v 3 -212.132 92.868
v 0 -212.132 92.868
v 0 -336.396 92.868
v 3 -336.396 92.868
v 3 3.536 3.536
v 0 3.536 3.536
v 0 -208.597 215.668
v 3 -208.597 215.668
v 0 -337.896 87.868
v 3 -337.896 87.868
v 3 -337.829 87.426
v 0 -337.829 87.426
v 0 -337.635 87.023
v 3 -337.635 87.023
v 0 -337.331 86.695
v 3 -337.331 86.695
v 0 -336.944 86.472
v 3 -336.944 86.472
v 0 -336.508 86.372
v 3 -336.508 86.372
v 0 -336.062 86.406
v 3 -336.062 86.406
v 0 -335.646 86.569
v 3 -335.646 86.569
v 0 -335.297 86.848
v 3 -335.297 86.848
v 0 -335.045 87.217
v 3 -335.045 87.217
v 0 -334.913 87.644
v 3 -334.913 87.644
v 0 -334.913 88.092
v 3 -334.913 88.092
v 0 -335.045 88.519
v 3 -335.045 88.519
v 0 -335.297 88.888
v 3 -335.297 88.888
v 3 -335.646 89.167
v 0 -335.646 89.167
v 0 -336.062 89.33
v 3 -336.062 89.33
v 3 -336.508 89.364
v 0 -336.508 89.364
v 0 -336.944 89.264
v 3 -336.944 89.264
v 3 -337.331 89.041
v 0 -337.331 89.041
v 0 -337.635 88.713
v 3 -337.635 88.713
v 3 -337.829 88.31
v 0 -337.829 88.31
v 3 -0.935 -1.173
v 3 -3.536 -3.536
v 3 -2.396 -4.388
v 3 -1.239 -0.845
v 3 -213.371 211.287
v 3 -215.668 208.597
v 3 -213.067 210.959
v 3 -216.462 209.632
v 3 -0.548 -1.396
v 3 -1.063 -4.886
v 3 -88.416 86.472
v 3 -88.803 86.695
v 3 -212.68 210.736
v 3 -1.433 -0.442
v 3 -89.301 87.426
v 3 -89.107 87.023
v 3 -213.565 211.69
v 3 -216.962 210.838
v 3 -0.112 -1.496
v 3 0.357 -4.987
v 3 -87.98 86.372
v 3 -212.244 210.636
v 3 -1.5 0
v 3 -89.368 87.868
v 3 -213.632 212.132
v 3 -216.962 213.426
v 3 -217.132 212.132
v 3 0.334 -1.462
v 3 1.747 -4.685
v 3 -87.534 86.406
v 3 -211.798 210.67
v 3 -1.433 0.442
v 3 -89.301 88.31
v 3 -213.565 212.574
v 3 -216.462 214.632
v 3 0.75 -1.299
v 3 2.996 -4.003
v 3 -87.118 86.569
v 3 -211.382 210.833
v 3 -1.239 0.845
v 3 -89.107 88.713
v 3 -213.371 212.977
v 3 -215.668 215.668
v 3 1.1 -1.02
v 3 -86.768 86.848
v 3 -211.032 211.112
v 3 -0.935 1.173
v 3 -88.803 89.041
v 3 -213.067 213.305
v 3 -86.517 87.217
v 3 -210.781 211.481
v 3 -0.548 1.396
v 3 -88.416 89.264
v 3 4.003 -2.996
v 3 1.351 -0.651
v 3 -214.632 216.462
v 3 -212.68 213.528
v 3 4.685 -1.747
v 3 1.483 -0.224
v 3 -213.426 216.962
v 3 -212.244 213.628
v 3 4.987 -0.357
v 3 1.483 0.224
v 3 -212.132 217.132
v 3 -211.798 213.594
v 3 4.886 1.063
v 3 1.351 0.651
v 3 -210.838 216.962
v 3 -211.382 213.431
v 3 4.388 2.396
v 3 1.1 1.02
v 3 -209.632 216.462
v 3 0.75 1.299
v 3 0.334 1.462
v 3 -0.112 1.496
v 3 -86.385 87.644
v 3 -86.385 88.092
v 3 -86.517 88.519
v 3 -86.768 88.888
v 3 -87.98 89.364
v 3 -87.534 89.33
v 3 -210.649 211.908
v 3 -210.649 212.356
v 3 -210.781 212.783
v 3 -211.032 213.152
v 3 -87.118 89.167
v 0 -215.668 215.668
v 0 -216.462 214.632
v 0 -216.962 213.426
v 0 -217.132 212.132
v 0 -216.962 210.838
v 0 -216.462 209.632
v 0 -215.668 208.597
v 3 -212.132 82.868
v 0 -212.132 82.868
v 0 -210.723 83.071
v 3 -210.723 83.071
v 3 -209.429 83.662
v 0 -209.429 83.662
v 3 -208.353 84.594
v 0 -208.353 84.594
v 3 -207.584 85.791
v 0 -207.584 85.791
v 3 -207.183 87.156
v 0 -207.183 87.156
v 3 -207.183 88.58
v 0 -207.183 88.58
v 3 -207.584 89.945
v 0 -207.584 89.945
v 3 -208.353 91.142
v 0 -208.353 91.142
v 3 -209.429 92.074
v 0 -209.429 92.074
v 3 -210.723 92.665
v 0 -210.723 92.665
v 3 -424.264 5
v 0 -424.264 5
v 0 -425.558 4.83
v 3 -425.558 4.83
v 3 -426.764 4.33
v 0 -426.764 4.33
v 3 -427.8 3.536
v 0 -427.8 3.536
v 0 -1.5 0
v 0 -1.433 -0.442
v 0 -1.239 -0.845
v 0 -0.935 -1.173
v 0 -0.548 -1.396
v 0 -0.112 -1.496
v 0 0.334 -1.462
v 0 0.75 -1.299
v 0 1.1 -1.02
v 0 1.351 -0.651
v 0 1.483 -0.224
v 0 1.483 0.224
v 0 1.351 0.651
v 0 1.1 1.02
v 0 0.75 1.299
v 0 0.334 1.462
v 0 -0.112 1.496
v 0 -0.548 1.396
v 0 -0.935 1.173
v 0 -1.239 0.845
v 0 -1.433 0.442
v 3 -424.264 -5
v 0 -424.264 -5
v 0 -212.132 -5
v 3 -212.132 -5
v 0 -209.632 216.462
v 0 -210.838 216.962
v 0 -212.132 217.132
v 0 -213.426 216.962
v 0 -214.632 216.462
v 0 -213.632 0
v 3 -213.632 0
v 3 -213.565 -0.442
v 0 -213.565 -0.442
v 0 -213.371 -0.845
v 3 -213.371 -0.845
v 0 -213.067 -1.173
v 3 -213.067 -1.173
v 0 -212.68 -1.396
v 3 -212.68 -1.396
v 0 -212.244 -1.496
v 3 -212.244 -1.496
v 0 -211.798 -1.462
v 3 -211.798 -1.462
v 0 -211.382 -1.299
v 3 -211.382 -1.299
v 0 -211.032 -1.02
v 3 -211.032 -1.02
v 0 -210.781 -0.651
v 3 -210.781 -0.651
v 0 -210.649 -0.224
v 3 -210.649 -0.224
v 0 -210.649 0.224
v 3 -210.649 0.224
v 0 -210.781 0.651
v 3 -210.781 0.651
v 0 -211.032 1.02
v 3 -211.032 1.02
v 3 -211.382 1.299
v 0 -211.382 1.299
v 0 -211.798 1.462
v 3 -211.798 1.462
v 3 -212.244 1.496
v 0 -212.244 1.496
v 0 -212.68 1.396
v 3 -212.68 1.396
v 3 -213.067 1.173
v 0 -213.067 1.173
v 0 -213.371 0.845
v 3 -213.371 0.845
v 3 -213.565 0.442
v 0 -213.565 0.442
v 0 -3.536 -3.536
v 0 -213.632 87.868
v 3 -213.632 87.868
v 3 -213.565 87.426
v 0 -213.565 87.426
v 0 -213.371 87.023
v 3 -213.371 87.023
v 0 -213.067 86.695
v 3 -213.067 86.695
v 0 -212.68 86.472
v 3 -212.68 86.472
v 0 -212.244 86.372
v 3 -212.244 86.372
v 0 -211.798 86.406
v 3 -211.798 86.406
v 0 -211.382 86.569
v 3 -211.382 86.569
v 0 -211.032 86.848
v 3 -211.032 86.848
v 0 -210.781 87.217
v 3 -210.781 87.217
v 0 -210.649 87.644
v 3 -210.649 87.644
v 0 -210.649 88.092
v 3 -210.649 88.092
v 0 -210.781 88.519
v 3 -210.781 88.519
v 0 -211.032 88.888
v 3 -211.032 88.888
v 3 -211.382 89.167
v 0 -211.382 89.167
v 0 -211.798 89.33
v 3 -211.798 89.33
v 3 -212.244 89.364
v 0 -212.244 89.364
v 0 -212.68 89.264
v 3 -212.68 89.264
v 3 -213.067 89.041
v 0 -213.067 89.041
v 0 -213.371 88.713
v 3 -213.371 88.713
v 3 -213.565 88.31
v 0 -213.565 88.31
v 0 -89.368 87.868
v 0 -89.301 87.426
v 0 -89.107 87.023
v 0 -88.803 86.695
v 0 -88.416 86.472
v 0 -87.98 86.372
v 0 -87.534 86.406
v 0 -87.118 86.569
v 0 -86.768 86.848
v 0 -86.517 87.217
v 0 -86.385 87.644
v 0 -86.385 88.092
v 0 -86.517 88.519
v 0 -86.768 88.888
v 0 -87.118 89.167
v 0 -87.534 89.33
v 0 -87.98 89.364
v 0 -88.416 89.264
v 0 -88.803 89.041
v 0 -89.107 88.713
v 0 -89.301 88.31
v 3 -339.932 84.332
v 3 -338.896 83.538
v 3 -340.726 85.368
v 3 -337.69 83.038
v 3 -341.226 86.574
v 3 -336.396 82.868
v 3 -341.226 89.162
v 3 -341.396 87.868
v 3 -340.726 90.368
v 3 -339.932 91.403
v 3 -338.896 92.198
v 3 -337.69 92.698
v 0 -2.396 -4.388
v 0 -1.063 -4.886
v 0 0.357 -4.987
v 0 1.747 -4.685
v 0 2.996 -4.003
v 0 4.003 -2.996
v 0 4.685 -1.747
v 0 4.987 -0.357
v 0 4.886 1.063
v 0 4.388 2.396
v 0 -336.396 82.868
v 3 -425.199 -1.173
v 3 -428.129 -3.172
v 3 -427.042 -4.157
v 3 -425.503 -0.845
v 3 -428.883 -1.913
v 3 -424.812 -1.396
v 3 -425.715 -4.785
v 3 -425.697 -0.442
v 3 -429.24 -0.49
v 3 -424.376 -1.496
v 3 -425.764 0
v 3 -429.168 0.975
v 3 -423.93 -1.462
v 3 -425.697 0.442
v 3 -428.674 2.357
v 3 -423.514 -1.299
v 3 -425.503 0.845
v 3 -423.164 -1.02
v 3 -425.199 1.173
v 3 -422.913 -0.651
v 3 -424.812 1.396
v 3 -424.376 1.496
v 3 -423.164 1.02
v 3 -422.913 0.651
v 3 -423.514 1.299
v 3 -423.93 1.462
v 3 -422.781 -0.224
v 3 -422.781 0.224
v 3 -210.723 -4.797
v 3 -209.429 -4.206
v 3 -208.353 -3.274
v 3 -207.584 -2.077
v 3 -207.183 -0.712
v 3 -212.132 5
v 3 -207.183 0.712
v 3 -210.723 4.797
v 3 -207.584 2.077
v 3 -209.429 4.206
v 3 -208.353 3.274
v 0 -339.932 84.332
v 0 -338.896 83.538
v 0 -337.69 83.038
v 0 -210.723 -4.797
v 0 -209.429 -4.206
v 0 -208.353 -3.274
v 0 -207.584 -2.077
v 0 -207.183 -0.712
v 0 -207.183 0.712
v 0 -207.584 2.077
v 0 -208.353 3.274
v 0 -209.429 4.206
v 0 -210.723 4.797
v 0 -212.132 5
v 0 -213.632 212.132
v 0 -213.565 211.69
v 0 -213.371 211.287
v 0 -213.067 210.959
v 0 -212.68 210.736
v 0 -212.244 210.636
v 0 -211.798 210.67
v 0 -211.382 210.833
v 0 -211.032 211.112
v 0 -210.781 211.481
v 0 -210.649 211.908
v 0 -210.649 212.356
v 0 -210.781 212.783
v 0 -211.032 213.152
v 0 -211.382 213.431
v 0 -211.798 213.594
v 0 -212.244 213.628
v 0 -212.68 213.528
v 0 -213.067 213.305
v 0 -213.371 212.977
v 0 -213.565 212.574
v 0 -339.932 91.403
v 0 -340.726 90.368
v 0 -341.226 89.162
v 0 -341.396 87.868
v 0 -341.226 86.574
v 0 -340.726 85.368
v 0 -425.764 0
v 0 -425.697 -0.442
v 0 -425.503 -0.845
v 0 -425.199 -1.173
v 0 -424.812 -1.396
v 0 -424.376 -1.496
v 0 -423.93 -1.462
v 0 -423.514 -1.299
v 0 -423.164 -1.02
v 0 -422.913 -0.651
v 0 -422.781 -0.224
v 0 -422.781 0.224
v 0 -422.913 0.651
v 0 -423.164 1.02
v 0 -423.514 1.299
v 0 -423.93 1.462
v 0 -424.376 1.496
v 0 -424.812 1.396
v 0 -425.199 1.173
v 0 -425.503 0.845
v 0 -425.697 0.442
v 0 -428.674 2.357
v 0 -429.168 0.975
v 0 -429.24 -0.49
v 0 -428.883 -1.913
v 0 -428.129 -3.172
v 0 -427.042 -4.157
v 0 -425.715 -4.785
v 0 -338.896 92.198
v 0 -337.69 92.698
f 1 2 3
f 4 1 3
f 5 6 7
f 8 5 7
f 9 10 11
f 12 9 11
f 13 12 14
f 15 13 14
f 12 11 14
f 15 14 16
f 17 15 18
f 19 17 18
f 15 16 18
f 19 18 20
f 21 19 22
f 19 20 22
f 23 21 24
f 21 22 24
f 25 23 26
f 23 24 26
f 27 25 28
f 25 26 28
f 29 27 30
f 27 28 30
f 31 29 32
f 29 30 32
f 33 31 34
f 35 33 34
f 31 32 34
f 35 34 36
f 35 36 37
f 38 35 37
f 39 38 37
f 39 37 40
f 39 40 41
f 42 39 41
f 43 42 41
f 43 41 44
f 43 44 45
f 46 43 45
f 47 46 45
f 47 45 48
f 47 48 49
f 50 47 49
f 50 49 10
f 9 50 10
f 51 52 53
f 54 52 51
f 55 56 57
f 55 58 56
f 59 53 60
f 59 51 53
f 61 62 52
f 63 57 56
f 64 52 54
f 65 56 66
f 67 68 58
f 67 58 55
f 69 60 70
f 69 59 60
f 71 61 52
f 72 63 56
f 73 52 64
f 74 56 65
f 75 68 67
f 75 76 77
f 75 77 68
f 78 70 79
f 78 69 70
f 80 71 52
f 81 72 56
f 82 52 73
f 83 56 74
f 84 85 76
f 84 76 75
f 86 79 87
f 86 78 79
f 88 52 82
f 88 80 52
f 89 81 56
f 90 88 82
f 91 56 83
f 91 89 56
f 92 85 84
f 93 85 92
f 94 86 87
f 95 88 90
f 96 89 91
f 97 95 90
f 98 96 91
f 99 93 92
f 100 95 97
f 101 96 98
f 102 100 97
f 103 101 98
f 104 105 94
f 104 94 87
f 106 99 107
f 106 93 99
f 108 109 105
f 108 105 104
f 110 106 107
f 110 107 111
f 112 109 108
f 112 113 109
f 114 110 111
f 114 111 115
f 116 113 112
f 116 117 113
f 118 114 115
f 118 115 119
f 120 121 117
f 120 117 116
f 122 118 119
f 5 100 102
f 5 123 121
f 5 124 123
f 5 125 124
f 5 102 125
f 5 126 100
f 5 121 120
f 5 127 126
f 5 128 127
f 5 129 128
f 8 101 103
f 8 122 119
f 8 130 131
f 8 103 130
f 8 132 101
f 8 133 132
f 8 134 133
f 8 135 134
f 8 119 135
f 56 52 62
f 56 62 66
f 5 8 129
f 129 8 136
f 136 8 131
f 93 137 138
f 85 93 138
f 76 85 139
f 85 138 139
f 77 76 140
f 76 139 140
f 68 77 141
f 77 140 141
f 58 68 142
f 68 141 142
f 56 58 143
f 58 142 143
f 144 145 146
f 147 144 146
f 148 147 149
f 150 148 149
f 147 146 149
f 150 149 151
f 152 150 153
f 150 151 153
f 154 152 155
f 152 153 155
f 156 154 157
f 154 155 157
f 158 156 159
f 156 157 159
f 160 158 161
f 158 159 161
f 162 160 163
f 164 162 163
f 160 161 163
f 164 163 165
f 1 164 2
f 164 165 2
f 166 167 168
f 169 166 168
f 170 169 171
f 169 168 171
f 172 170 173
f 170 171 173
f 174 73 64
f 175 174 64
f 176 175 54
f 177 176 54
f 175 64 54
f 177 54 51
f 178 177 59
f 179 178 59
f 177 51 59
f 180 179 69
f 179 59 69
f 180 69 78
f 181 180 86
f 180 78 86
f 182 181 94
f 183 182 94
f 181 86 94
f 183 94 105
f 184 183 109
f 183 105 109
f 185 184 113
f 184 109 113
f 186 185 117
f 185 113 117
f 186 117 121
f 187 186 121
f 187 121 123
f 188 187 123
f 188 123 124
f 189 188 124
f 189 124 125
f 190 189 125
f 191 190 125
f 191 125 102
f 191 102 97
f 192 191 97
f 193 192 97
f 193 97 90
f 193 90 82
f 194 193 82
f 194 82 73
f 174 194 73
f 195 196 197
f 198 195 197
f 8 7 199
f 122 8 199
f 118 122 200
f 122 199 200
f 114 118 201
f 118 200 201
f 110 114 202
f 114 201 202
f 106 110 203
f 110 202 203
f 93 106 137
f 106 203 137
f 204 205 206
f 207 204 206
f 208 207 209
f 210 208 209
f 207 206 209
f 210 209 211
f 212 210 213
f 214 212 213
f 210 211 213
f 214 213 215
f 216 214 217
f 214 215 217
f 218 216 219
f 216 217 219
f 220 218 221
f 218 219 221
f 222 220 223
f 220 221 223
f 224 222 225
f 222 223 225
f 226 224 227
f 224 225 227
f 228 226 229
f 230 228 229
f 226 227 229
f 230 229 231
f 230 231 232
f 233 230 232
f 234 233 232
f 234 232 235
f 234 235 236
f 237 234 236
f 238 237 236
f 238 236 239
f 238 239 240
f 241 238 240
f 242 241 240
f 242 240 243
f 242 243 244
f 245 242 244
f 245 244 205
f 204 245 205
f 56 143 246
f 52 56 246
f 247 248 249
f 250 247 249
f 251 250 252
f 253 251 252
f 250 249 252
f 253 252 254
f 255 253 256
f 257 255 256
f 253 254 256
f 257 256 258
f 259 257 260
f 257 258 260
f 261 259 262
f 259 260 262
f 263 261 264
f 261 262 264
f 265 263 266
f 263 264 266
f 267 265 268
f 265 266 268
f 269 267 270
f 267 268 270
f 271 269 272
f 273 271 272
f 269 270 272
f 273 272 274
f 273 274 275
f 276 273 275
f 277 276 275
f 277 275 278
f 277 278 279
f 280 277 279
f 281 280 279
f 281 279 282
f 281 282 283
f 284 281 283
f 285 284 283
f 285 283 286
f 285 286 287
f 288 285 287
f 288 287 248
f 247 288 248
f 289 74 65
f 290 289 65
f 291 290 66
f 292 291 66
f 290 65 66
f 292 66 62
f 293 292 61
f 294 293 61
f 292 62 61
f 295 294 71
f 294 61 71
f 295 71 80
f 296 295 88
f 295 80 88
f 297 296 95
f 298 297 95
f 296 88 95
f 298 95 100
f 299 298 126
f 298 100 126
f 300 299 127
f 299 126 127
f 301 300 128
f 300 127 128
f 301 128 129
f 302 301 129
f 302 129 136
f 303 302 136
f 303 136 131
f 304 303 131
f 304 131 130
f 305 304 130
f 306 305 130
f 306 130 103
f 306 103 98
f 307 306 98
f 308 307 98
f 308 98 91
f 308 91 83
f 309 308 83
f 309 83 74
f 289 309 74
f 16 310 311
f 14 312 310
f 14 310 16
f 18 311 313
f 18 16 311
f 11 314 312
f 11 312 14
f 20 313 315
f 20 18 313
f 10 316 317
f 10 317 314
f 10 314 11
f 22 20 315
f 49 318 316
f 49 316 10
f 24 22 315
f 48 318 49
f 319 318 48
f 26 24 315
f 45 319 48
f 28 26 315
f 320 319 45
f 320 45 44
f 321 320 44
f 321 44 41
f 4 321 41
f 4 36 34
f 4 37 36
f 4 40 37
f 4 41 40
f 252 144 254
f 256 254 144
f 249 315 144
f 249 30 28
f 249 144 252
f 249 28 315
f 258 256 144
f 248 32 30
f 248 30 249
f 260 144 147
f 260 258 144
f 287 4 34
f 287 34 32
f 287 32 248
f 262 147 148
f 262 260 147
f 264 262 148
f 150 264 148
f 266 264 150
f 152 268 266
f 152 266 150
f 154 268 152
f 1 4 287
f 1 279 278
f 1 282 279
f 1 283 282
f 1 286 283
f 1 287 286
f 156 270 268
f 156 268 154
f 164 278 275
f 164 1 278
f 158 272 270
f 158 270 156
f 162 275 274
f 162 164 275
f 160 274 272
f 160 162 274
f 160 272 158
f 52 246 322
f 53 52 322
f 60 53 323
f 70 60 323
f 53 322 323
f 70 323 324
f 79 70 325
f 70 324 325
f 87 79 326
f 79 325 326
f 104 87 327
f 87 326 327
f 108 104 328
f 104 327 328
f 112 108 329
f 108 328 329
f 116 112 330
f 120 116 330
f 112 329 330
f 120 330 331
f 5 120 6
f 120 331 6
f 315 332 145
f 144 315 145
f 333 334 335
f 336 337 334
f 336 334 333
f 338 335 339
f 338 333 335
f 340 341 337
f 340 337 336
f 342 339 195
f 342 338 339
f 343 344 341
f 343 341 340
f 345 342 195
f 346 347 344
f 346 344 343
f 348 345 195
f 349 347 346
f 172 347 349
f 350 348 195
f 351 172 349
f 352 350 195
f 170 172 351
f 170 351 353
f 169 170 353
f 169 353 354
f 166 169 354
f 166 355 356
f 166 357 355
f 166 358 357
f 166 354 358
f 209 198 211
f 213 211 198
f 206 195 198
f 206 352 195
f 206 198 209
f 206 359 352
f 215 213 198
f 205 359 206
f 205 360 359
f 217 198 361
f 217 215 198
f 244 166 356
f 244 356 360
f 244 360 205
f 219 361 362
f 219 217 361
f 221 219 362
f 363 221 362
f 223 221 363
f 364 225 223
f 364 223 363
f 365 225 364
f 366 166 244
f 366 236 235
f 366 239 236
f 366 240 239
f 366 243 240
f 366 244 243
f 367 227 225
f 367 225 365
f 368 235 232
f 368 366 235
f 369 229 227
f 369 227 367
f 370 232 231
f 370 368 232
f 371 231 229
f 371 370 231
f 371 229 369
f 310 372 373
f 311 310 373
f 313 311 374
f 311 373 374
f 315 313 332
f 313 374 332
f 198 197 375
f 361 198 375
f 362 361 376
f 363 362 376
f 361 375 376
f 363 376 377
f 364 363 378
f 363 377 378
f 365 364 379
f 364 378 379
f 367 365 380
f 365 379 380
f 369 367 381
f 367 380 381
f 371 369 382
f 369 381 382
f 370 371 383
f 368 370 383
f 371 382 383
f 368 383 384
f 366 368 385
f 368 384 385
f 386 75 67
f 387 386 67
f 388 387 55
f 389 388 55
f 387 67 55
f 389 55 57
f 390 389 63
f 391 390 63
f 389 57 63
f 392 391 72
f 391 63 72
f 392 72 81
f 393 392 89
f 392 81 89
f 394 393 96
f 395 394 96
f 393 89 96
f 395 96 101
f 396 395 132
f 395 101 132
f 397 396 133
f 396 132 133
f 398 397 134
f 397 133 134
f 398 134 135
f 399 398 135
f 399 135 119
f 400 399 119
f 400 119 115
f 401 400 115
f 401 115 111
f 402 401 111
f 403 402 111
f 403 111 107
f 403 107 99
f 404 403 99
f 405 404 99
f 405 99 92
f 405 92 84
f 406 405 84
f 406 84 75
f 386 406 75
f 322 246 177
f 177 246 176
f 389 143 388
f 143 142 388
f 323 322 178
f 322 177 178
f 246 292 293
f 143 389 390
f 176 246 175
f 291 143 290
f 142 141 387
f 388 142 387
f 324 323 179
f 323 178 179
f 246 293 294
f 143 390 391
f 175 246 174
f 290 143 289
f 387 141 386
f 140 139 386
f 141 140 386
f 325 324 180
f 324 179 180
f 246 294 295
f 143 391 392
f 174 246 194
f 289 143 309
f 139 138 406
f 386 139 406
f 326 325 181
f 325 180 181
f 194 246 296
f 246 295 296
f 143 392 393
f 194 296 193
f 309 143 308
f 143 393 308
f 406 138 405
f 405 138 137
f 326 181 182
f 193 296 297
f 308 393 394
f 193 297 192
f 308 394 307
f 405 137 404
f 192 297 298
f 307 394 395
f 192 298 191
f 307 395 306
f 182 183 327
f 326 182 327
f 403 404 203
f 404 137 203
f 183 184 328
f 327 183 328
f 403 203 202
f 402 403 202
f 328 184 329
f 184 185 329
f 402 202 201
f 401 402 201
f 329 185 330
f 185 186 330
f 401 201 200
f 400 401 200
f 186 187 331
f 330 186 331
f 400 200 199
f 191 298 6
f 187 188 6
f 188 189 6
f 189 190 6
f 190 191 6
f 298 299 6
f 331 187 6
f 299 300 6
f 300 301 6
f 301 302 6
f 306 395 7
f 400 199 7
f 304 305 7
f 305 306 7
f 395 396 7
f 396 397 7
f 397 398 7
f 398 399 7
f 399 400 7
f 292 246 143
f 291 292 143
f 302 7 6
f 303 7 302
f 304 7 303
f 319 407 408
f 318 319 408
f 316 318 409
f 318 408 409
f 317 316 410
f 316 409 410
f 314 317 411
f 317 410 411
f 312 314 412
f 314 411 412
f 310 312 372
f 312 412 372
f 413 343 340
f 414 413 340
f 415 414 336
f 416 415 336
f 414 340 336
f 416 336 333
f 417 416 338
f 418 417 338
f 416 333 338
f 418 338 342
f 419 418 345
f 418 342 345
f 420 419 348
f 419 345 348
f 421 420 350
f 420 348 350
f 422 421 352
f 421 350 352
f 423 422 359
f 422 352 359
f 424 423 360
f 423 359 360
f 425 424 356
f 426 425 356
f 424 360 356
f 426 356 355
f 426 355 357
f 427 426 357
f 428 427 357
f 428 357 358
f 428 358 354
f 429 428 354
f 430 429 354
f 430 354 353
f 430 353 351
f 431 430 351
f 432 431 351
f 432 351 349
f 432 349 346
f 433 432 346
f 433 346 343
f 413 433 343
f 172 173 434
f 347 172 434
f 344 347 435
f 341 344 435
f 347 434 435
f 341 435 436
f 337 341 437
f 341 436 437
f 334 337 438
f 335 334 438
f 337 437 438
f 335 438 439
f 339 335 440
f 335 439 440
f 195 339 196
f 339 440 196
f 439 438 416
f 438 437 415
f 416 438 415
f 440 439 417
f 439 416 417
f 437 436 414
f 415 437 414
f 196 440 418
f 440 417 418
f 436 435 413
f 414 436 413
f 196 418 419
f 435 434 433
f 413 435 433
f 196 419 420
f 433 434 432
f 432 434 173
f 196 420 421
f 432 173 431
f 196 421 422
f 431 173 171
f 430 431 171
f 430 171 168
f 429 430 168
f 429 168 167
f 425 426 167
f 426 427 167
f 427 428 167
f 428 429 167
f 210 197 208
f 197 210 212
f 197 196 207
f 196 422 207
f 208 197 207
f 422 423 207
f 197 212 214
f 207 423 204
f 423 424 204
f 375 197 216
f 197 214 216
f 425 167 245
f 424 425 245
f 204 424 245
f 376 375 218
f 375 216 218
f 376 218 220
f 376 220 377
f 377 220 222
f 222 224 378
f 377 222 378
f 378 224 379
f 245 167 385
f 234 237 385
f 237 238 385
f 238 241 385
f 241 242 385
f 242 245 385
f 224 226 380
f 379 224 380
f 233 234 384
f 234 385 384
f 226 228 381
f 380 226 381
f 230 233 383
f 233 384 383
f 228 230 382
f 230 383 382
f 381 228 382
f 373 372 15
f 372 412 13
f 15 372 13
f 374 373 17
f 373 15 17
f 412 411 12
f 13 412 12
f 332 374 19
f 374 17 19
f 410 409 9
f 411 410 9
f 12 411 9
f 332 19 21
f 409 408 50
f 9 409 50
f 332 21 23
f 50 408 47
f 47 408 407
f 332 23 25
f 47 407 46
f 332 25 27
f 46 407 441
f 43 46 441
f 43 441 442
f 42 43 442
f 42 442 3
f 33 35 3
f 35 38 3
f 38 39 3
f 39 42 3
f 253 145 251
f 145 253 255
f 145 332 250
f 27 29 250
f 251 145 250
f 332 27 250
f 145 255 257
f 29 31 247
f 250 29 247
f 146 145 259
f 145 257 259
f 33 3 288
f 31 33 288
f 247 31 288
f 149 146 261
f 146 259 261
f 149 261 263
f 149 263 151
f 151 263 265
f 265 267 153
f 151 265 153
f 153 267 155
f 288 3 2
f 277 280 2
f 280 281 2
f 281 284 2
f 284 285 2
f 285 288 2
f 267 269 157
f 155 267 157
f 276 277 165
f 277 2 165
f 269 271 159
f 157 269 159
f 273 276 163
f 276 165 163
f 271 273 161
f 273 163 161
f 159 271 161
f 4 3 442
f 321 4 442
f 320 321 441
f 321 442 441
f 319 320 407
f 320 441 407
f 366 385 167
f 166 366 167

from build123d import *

# Parameters (mm, degrees)
F1_DEPTH = 3
F2_DEPTH = 3
F3_D     = 3
F3_2_D   = 3
F4_DEPTH = 3
F5_D     = 3
F6_D     = 3


with BuildPart() as f1:
    # F0 (on Right) → F1 (new body)
    with BuildSketch(Plane.YZ):
        with BuildLine():
            ThreePointArc((-208.59650045, 215.6675682619), (-207.132034356, 212.132034356), (-208.59650045, 208.59650045))
            Line((-208.59650045, 208.59650045), (-212.132034356, 205.0609665441))
            Line((-212.132034356, 205.0609665441), (-3.5355339059, -3.5355339059))
            ThreePointArc((-3.5355339059, -3.5355339059), (3.5355339059, -3.5355339059), (3.5355339059, 3.5355339059))
            Line((3.5355339059, 3.5355339059), (-208.59650045, 215.6675682619))
        make_face()
        Polygon((-212.132034356, 205.0609665441), (-208.59650045, 208.59650045), (-212.132034356, 212.132034356), (-215.6675682619, 208.59650045), align=None)
        with BuildLine():
            Line((-212.132034356, 212.132034356), (-208.59650045, 208.59650045))
            ThreePointArc((-208.59650045, 208.59650045), (-207.132034356, 212.132034356), (-208.59650045, 215.6675682619))
            ThreePointArc((-208.59650045, 215.6675682619), (-212.132034356, 217.132034356), (-215.6675682619, 215.6675682619))
            ThreePointArc((-215.6675682619, 215.6675682619), (-217.132034356, 212.132034356), (-215.6675682619, 208.59650045))
            Line((-215.6675682619, 208.59650045), (-212.132034356, 212.132034356))
        make_face()
    extrude(amount=F1_DEPTH)

    # F3 (through all)
    with Locations(Plane(origin=(0, 0, 0), x_dir=(0, 1, 0), z_dir=(-1, 0, 0))):
        with Locations((-212.132034356, 0), (-424.2640687119, 0), (0, 0), (-212.132034356, -212.132034356)):
            Hole(F3_D / 2)

    # F6 (through all)
    with Locations(Plane(origin=(0, 0, 0), x_dir=(0, 1, 0), z_dir=(-1, 0, 0))):
        with Locations((-87.867965644, -87.867965644)):
            Hole(F6_D / 2)


with BuildPart() as f2:
    # F0 (on Right) → F2 (new body)
    with BuildSketch(Plane.YZ):
        with BuildLine():
            ThreePointArc((-420.728534806, -3.5355339059), (-422.3506515501, -4.6193976626), (-424.2640687119, -5))
            Line((-424.2640687119, -5), (-212.132034356, -5))
            ThreePointArc((-212.132034356, -5), (-207.132034356, 0), (-212.132034356, 5))
            Line((-212.132034356, 5), (-412.1930009001, 5))
            Line((-412.1930009001, 5), (-417.1930009001, 0))
            Line((-417.1930009001, 0), (-420.728534806, -3.5355339059))
        make_face()
        Polygon((-412.1930009001, 5), (-419.2640687119, 5), (-424.2640687119, 0), (-417.1930009001, 0), align=None)
        with BuildLine():
            ThreePointArc((-424.2640687119, 5), (-426.1774858738, 4.6193976626), (-427.7996026179, 3.5355339059))
            ThreePointArc((-427.7996026179, 3.5355339059), (-428.8834663745, -1.9134171618), (-424.2640687119, -5))
            ThreePointArc((-424.2640687119, -5), (-422.3506515501, -4.6193976626), (-420.728534806, -3.5355339059))
            Line((-420.728534806, -3.5355339059), (-417.1930009001, 0))
            Line((-417.1930009001, 0), (-424.2640687119, 0))
            Line((-424.2640687119, 0), (-419.2640687119, 5))
            Line((-419.2640687119, 5), (-424.2640687119, 5))
        make_face()
    extrude(amount=F2_DEPTH)

    # F3#2 (through all)
    with Locations(Plane(origin=(0, 0, 0), x_dir=(0, 1, 0), z_dir=(-1, 0, 0))):
        with Locations((-212.132034356, 0), (-424.2640687119, 0), (0, 0), (-212.132034356, -212.132034356)):
            Hole(F3_2_D / 2)


with BuildPart() as f4:
    # F0 (on Right) → F4 (new body)
    with BuildSketch(Plane.YZ):
        with BuildLine():
            Line((-212.132034356, 92.867965644), (-324.325035256, 92.867965644))
            Line((-324.325035256, 92.867965644), (-329.325035256, 87.867965644))
            Line((-329.325035256, 87.867965644), (-334.325035256, 82.867965644))
            Line((-334.325035256, 82.867965644), (-212.132034356, 82.867965644))
            ThreePointArc((-212.132034356, 82.867965644), (-207.132034356, 87.867965644), (-212.132034356, 92.867965644))
        make_face()
        Polygon((-329.325035256, 87.867965644), (-324.325035256, 92.867965644), (-331.3961030679, 92.867965644), (-336.3961030679, 87.867965644), align=None)
        with BuildLine():
            Line((-336.3961030679, 87.867965644), (-331.3961030679, 92.867965644))
            Line((-331.3961030679, 92.867965644), (-336.3961030679, 92.867965644))
            ThreePointArc((-336.3961030679, 92.867965644), (-338.3095202384, 92.487363303), (-339.9316369872, 91.4034995366))
            ThreePointArc((-339.9316369872, 91.4034995366), (-341.3961030679, 87.8679656346), (-339.9316369738, 84.3324317381))
            Line((-339.9316369738, 84.3324317381), (-336.3961030679, 87.867965644))
        make_face()
        with BuildLine():
            Line((-334.325035256, 82.867965644), (-329.325035256, 87.867965644))
            Line((-329.325035256, 87.867965644), (-336.3961030679, 87.867965644))
            Line((-336.3961030679, 87.867965644), (-339.9316369738, 84.3324317381))
            ThreePointArc((-339.9316369738, 84.3324317381), (-338.3095202297, 83.2485679815), (-336.3961030679, 82.867965644))
            Line((-336.3961030679, 82.867965644), (-334.325035256, 82.867965644))
        make_face()
    extrude(amount=F4_DEPTH)

    # F5 (through all)
    with Locations(Plane(origin=(0, 0, 0), x_dir=(0, 1, 0), z_dir=(-1, 0, 0))):
        with Locations((-336.3961030679, -87.867965644), (-212.132034356, -87.867965644)):
            Hole(F5_D / 2)


solid = Compound([f1.part, f2.part, f4.part])
